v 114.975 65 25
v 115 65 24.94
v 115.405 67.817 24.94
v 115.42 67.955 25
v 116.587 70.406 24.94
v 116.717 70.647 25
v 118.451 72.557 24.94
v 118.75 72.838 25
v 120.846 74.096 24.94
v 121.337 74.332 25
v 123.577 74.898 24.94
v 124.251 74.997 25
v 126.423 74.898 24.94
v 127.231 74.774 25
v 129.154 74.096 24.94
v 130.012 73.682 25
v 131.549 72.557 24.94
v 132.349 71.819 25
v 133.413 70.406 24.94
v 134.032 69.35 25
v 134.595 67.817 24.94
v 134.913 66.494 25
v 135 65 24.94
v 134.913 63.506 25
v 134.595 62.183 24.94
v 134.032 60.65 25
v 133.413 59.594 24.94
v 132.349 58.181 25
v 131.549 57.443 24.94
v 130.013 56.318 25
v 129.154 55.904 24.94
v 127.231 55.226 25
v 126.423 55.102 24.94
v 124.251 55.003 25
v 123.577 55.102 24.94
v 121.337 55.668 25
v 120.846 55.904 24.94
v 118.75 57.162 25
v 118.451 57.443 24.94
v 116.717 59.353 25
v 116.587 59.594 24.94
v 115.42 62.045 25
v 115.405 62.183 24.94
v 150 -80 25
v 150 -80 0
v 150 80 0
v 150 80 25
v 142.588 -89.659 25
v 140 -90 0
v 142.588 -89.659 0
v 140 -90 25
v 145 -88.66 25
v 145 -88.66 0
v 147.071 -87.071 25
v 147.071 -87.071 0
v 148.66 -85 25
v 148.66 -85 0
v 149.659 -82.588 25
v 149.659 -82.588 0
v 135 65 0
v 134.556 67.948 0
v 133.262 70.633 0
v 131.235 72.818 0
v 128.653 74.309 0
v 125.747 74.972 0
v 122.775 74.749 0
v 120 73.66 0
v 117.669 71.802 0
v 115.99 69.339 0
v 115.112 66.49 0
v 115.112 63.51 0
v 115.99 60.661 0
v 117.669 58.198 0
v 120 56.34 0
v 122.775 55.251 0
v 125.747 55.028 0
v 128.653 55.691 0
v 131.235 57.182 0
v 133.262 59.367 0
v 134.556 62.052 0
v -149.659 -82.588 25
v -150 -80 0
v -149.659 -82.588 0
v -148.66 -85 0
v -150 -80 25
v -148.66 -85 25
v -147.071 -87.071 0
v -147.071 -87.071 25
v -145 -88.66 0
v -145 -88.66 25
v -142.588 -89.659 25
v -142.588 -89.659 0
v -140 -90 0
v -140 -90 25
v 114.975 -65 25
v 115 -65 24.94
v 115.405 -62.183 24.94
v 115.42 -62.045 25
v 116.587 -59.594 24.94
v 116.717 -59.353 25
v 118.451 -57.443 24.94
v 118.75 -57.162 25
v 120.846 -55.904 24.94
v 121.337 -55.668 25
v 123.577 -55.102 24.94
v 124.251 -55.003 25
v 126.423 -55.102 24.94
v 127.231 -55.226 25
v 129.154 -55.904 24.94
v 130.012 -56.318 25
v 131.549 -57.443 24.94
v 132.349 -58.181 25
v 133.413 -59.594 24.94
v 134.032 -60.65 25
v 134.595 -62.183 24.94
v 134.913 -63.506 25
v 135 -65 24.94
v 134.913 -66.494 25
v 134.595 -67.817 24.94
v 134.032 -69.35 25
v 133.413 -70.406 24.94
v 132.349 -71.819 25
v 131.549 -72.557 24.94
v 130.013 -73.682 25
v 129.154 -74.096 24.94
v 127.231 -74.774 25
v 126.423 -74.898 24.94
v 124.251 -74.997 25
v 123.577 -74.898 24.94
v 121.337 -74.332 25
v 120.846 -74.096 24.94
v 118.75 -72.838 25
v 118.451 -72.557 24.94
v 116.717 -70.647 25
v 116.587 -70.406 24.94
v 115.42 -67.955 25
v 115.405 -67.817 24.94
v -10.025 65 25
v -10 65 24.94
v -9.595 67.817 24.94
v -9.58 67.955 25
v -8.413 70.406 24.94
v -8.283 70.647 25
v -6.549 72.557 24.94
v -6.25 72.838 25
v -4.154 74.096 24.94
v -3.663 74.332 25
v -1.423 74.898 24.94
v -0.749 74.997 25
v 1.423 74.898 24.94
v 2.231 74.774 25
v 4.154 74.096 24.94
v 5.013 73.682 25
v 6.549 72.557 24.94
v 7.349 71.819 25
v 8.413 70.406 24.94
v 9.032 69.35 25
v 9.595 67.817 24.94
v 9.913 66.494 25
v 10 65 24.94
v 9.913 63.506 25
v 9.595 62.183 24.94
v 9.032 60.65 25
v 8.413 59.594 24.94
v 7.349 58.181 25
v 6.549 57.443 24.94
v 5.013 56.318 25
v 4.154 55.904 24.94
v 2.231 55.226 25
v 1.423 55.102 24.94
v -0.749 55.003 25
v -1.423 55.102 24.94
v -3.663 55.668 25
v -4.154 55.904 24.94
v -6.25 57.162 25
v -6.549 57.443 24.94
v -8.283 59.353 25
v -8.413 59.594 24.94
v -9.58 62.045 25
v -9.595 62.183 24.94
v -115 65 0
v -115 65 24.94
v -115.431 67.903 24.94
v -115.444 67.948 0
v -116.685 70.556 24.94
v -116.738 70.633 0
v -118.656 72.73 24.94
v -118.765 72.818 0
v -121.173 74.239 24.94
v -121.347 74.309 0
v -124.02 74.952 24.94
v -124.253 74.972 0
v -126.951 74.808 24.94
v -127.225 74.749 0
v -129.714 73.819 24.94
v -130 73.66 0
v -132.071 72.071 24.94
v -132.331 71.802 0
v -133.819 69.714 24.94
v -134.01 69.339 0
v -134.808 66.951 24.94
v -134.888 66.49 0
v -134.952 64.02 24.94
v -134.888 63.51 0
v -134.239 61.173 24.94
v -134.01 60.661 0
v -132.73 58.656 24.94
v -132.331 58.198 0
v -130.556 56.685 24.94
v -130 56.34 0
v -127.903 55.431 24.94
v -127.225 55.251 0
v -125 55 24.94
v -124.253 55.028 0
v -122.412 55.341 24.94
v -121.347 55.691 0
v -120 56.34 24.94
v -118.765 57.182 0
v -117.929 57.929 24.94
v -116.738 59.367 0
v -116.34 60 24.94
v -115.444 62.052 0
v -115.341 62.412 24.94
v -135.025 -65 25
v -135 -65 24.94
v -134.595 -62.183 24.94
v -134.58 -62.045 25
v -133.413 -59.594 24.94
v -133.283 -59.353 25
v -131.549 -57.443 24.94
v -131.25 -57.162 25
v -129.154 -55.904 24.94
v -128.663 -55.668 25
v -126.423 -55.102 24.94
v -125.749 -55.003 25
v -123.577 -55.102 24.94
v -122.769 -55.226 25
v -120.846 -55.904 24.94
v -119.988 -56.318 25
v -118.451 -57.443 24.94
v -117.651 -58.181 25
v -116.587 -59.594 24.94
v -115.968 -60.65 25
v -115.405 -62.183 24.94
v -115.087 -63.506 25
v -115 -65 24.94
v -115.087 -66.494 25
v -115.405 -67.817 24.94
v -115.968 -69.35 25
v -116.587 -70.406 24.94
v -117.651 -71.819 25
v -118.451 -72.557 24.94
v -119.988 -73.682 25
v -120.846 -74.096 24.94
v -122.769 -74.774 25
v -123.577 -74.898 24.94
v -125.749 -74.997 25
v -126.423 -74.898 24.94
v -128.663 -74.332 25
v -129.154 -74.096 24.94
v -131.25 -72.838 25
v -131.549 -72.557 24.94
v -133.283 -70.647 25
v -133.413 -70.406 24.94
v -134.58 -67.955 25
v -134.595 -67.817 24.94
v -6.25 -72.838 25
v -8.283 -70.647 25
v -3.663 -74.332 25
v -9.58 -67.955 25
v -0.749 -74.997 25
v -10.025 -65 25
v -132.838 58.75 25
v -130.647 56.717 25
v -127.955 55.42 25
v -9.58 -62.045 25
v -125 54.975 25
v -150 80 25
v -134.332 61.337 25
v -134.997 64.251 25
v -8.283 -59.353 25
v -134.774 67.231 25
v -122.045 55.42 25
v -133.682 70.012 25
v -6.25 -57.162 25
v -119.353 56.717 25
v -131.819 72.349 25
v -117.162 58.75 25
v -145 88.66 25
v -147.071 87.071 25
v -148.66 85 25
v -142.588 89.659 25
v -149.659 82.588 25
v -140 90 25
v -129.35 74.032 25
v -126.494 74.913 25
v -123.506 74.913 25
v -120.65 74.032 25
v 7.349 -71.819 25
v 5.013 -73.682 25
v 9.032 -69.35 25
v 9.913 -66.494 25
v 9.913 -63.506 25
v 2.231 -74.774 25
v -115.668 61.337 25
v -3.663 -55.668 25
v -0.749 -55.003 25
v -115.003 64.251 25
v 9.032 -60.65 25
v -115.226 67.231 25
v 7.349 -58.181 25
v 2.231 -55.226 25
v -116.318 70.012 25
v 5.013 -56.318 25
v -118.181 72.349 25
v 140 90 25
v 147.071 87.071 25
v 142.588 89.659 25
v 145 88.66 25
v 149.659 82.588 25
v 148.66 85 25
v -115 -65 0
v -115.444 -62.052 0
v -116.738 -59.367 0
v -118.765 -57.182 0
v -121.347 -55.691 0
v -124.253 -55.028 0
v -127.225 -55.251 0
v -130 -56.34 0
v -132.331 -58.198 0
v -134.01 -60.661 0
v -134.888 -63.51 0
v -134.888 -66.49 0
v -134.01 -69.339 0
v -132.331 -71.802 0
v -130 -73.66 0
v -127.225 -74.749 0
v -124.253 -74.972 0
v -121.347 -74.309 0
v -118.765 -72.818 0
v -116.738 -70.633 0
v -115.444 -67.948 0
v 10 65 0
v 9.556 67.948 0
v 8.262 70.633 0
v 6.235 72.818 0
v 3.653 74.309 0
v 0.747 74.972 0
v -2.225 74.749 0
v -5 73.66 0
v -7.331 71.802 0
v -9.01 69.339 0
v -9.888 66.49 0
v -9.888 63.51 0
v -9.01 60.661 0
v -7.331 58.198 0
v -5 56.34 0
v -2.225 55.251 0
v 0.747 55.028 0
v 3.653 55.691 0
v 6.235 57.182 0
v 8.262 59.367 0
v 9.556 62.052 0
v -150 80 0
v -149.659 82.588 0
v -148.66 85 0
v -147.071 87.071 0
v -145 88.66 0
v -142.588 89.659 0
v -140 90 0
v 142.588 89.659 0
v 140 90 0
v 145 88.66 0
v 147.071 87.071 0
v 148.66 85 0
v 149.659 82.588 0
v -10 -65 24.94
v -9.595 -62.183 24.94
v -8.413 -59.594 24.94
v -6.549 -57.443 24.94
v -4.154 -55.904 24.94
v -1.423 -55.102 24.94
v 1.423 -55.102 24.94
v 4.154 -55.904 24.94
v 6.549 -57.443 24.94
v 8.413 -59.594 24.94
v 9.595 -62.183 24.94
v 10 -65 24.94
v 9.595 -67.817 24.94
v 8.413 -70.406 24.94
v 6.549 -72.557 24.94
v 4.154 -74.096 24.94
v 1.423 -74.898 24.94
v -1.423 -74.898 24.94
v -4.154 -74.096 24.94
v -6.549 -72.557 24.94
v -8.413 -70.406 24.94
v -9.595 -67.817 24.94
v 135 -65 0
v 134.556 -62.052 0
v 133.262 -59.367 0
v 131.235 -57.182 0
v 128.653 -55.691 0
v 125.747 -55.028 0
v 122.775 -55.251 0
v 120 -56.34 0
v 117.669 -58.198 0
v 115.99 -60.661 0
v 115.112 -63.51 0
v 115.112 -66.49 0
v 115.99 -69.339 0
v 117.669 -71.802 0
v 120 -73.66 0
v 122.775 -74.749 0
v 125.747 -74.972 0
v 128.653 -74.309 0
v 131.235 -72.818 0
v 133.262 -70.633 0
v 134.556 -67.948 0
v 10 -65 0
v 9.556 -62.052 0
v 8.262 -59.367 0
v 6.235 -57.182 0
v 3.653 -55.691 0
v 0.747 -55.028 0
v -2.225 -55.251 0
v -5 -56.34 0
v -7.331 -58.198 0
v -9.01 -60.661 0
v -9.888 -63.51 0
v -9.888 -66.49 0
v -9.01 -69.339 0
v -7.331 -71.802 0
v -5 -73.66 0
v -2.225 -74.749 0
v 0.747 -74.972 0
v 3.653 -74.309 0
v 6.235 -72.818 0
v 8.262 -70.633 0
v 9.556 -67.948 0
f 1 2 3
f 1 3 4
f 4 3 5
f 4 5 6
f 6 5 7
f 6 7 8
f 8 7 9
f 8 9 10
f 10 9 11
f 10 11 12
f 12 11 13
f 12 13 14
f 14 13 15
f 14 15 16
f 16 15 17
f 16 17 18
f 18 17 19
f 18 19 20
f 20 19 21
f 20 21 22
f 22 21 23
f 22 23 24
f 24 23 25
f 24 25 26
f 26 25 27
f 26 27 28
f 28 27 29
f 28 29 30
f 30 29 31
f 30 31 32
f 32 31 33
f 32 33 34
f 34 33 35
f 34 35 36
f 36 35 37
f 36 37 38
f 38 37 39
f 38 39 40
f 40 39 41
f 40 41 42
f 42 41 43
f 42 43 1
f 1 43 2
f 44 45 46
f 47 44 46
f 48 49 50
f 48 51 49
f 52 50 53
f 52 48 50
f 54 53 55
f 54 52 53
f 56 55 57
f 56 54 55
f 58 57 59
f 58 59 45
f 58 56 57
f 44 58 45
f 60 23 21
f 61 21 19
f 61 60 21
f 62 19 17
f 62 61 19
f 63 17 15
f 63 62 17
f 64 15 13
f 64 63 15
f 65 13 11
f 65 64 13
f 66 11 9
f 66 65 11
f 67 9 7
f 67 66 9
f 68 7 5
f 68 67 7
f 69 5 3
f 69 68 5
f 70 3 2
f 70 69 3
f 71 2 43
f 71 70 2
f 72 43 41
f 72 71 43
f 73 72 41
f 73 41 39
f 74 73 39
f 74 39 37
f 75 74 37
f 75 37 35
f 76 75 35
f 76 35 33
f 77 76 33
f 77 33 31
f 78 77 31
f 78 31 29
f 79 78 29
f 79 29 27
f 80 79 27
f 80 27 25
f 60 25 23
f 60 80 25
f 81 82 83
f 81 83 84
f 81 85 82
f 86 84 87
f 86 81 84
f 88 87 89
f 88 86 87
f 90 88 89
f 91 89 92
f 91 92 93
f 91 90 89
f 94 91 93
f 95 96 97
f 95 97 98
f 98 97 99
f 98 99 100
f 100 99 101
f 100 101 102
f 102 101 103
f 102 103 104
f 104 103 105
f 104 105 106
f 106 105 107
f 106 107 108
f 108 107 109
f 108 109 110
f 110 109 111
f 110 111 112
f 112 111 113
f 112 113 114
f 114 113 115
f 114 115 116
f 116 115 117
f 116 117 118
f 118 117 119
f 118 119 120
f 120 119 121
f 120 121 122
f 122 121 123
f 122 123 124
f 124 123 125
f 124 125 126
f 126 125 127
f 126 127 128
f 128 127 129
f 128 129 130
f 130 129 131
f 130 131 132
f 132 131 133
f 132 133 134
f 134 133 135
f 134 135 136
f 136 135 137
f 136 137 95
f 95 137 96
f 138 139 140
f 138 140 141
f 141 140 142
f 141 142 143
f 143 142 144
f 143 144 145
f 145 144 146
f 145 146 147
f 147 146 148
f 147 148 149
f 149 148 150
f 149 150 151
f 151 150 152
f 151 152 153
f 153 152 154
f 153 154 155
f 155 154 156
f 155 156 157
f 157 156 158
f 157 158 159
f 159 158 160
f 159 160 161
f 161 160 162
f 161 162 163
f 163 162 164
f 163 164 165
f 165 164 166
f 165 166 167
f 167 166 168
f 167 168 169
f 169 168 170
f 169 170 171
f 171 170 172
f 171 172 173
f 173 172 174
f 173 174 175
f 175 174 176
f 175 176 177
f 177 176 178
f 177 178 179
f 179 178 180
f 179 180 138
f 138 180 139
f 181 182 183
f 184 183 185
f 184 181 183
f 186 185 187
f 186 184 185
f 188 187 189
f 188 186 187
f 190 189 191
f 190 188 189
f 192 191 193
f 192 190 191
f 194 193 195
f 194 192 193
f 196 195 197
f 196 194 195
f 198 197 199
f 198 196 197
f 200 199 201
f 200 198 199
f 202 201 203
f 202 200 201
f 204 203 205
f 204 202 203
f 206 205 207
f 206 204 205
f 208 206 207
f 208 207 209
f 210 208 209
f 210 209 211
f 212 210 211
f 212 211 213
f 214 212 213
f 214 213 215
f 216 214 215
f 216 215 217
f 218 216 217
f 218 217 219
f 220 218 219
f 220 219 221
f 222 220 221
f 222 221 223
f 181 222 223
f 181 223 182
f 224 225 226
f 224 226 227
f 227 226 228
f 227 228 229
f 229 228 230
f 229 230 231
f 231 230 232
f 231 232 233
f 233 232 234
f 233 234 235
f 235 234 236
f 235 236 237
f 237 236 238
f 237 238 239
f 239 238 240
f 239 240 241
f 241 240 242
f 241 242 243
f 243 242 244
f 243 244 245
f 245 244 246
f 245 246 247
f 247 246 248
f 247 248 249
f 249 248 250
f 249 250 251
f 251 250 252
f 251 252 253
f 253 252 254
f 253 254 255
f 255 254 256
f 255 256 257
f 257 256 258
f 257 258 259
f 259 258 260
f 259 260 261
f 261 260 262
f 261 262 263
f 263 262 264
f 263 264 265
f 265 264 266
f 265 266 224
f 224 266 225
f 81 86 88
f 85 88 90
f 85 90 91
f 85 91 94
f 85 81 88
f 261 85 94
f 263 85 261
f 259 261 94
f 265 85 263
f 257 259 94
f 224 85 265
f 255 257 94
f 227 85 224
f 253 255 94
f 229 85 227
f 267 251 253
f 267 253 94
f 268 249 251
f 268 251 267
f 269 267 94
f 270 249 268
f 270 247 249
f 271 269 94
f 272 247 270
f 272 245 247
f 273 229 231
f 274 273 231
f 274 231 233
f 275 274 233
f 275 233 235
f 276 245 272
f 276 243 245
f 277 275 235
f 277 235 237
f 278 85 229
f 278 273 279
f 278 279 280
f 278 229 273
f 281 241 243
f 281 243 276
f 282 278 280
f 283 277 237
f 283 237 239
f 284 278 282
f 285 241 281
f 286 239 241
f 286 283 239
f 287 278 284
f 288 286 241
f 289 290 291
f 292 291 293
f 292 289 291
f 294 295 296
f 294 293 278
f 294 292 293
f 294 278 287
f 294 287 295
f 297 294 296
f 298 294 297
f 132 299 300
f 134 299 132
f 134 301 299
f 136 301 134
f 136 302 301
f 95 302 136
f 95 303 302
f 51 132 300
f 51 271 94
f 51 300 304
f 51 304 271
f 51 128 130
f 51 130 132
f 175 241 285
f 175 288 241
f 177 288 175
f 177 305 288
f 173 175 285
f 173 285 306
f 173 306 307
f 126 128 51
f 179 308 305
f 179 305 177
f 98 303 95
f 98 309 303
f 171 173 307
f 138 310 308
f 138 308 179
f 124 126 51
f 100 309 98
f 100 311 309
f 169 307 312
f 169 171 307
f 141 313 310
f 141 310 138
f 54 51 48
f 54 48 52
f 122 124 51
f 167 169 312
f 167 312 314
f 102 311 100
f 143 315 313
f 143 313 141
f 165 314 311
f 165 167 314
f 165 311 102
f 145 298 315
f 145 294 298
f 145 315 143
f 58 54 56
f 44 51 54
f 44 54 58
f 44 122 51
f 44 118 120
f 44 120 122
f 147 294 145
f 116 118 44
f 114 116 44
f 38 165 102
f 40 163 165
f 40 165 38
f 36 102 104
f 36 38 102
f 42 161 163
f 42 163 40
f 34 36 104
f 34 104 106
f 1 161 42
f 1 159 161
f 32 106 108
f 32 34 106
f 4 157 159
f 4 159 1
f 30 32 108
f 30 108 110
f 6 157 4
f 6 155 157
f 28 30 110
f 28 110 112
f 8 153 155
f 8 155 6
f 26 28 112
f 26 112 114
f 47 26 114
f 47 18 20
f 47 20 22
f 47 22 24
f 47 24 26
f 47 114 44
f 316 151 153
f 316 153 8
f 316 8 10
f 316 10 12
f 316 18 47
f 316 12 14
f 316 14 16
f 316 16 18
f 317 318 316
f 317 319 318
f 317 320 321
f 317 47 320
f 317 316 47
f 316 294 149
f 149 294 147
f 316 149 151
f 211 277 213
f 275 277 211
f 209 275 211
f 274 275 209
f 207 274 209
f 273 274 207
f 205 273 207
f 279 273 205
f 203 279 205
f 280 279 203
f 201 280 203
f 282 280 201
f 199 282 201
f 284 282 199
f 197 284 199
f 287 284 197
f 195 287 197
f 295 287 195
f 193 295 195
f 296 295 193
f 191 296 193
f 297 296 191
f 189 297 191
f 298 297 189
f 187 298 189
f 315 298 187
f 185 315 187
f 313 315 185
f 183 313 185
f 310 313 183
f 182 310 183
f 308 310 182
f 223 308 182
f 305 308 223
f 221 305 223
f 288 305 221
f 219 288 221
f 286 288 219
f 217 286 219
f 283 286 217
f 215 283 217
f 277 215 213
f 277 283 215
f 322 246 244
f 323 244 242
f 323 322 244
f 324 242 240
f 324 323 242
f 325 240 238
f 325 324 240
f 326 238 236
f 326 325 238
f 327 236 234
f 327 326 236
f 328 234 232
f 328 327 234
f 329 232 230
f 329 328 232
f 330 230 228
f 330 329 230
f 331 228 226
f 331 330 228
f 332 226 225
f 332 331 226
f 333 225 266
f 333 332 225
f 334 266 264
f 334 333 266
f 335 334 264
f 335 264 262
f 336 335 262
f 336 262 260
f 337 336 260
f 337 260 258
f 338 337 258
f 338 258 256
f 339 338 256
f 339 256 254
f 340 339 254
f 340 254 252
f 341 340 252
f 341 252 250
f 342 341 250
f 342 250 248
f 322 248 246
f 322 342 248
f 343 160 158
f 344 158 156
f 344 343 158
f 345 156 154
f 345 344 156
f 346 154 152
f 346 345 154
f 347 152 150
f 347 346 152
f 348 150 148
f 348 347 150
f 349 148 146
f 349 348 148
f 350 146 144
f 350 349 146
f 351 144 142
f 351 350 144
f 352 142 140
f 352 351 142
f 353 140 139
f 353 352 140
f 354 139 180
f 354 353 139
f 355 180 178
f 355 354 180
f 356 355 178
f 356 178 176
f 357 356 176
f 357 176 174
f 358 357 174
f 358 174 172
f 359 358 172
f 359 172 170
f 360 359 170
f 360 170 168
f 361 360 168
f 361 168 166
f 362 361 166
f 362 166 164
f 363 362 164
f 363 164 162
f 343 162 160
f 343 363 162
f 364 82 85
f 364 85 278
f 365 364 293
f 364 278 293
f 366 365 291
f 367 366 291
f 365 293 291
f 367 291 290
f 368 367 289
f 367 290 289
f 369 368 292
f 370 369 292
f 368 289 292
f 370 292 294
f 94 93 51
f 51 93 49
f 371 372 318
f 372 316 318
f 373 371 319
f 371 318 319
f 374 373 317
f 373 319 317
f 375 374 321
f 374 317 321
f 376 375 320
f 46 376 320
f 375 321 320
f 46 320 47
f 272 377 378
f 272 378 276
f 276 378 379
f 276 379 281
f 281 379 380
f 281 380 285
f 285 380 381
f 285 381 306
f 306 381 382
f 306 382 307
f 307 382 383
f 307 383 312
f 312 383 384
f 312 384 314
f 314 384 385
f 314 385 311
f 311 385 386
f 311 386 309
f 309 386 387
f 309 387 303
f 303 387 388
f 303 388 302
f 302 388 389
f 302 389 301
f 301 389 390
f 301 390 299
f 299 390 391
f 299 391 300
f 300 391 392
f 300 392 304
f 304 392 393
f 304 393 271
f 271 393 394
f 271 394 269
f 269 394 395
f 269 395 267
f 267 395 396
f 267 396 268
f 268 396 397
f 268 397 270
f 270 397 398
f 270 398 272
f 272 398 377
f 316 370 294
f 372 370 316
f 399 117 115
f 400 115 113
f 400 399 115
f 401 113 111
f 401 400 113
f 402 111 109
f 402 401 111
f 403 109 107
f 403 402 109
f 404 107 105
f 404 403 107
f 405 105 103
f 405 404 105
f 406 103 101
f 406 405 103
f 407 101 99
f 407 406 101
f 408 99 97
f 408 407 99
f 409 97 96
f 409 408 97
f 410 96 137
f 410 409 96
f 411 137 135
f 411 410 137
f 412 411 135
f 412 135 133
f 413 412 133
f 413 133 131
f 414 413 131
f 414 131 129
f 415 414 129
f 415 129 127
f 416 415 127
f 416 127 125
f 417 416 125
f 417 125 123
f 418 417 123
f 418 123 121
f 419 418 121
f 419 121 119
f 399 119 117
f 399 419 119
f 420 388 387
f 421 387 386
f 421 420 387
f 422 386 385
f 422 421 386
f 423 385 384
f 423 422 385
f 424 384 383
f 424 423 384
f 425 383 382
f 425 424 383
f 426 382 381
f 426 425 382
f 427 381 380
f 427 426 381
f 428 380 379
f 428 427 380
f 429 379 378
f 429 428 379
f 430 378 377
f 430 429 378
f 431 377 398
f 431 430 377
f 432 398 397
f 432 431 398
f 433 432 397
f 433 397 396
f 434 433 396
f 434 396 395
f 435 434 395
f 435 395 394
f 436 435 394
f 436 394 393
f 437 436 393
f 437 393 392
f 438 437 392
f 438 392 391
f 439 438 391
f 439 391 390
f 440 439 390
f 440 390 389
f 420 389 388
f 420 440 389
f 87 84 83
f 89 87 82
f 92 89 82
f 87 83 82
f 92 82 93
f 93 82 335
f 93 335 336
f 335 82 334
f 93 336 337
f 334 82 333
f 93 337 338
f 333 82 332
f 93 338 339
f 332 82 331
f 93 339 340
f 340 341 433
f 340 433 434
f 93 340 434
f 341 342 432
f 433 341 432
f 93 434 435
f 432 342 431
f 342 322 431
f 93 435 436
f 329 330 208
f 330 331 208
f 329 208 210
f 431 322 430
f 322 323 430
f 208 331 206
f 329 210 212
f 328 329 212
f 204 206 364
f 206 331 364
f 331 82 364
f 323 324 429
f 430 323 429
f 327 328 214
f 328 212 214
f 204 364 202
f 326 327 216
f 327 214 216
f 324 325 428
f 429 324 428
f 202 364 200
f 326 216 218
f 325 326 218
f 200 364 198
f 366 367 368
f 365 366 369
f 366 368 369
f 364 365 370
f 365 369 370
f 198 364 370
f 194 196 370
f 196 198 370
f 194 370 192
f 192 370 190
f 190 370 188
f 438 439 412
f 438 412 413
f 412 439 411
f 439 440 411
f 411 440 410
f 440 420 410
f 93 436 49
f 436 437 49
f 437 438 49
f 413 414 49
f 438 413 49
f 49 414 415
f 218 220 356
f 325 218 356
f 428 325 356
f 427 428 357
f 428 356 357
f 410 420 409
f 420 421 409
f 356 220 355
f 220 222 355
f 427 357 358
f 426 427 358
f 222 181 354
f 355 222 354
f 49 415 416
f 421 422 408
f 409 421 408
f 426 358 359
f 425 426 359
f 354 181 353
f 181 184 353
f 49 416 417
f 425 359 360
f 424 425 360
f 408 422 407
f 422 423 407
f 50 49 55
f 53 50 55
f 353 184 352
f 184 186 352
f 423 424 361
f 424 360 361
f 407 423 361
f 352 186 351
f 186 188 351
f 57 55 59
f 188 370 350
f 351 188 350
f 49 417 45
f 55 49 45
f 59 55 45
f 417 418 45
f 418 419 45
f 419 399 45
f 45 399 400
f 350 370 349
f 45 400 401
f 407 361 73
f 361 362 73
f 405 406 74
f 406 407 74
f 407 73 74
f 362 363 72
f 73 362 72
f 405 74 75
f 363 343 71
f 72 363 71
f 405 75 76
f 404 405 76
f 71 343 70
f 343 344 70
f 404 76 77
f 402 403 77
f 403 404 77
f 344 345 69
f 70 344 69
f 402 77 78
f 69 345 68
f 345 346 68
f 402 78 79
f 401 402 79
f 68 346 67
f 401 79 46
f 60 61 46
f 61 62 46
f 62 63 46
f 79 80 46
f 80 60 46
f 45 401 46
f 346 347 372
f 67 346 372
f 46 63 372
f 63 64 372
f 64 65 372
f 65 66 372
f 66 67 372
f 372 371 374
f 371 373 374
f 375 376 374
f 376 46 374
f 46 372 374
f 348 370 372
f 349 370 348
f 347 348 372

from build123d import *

# Parameters (mm, degrees)
SKETCH3_W                        = 300
SKETCH3_H                        = 180
SKETCH3_R                        = 10
BOSS_EXTRUDE2_DEPTH              = 25
FILLET1_R                        = 10
FILLET2_R                        = 10
F_20_0MM_DOWEL_HOLE4_D           = 20
F_20_0MM_DOWEL_HOLE4_DEPTH       = 27.005
F_20_0MM_DOWEL_HOLE4_CSINK_D     = 20.05
F_20_0MM_DOWEL_HOLE4_CSINK_ANGLE = 45
F_20_0MM_DOWEL_HOLE4_TIP         = 6.00860619


with BuildPart() as part:
    # Sketch3 → Boss-Extrude2 (new body)
    with BuildSketch(Plane.XY):
        Rectangle(SKETCH3_W, SKETCH3_H)
        with Locations((-125, 65)):
            Circle(SKETCH3_R, mode=Mode.SUBTRACT)
        with Locations((-125, -65)):
            Circle(SKETCH3_R, mode=Mode.SUBTRACT)
        with Locations((0, 65)):
            Circle(SKETCH3_R, mode=Mode.SUBTRACT)
        with Locations((0, -65)):
            Circle(SKETCH3_R, mode=Mode.SUBTRACT)
        with Locations((125, 65)):
            Circle(SKETCH3_R, mode=Mode.SUBTRACT)
        with Locations((125, -65)):
            Circle(SKETCH3_R, mode=Mode.SUBTRACT)
    extrude(amount=BOSS_EXTRUDE2_DEPTH)

    # Fillet1
    fillet1_edges = [part.edges().sort_by_distance(p)[0] for p in [
        (-150, 90, 12.5),
    ]]
    fillet(fillet1_edges, radius=FILLET1_R)

    # Fillet2
    fillet2_edges = [part.edges().sort_by_distance(p)[0] for p in [
        (150, 90, 12.5),
        (150, -90, 12.5),
        (-150, -90, 12.5),
    ]]
    fillet(fillet2_edges, radius=FILLET2_R)

    # Sketch7 → Ø20.0mm Dowel Hole3 (revolve, cut)
    with BuildSketch(Plane(origin=(-125, 65, 25), x_dir=(0, -1, 0), z_dir=(1, 0, 0))):
        Polygon((0, 0), (0, 33.01360619), (10, 27.005), (10, 0.060355339), (10.025, 0), align=None)
    f_20_0mm_dowel_hole3 = revolve(axis=Axis((-125, 65, 31.35), (0, 0, -1)), mode=Mode.SUBTRACT)

    # Mirror2: Ø20.0mm Dowel Hole3 across plane
    add(f_20_0mm_dowel_hole3.mirror(Plane.XY.offset(25)), mode=Mode.SUBTRACT)

    # Ø20.0mm Dowel Hole4
    with Locations(Plane(origin=(-125, 65, 25), x_dir=(1, 0, 0), z_dir=(0, 0, 1))):
        with Locations((0, 0), (0, -130), (125, 0), (125, -130), (250, -130), (250, 0)):
            CounterSinkHole(F_20_0MM_DOWEL_HOLE4_D / 2, F_20_0MM_DOWEL_HOLE4_CSINK_D / 2, depth=F_20_0MM_DOWEL_HOLE4_DEPTH, counter_sink_angle=F_20_0MM_DOWEL_HOLE4_CSINK_ANGLE)
            with Locations((0, 0, -(F_20_0MM_DOWEL_HOLE4_DEPTH + F_20_0MM_DOWEL_HOLE4_TIP / 2))):  # 118° drill point
                Cone(0, F_20_0MM_DOWEL_HOLE4_D / 2, F_20_0MM_DOWEL_HOLE4_TIP, mode=Mode.SUBTRACT)


solid = part.part
